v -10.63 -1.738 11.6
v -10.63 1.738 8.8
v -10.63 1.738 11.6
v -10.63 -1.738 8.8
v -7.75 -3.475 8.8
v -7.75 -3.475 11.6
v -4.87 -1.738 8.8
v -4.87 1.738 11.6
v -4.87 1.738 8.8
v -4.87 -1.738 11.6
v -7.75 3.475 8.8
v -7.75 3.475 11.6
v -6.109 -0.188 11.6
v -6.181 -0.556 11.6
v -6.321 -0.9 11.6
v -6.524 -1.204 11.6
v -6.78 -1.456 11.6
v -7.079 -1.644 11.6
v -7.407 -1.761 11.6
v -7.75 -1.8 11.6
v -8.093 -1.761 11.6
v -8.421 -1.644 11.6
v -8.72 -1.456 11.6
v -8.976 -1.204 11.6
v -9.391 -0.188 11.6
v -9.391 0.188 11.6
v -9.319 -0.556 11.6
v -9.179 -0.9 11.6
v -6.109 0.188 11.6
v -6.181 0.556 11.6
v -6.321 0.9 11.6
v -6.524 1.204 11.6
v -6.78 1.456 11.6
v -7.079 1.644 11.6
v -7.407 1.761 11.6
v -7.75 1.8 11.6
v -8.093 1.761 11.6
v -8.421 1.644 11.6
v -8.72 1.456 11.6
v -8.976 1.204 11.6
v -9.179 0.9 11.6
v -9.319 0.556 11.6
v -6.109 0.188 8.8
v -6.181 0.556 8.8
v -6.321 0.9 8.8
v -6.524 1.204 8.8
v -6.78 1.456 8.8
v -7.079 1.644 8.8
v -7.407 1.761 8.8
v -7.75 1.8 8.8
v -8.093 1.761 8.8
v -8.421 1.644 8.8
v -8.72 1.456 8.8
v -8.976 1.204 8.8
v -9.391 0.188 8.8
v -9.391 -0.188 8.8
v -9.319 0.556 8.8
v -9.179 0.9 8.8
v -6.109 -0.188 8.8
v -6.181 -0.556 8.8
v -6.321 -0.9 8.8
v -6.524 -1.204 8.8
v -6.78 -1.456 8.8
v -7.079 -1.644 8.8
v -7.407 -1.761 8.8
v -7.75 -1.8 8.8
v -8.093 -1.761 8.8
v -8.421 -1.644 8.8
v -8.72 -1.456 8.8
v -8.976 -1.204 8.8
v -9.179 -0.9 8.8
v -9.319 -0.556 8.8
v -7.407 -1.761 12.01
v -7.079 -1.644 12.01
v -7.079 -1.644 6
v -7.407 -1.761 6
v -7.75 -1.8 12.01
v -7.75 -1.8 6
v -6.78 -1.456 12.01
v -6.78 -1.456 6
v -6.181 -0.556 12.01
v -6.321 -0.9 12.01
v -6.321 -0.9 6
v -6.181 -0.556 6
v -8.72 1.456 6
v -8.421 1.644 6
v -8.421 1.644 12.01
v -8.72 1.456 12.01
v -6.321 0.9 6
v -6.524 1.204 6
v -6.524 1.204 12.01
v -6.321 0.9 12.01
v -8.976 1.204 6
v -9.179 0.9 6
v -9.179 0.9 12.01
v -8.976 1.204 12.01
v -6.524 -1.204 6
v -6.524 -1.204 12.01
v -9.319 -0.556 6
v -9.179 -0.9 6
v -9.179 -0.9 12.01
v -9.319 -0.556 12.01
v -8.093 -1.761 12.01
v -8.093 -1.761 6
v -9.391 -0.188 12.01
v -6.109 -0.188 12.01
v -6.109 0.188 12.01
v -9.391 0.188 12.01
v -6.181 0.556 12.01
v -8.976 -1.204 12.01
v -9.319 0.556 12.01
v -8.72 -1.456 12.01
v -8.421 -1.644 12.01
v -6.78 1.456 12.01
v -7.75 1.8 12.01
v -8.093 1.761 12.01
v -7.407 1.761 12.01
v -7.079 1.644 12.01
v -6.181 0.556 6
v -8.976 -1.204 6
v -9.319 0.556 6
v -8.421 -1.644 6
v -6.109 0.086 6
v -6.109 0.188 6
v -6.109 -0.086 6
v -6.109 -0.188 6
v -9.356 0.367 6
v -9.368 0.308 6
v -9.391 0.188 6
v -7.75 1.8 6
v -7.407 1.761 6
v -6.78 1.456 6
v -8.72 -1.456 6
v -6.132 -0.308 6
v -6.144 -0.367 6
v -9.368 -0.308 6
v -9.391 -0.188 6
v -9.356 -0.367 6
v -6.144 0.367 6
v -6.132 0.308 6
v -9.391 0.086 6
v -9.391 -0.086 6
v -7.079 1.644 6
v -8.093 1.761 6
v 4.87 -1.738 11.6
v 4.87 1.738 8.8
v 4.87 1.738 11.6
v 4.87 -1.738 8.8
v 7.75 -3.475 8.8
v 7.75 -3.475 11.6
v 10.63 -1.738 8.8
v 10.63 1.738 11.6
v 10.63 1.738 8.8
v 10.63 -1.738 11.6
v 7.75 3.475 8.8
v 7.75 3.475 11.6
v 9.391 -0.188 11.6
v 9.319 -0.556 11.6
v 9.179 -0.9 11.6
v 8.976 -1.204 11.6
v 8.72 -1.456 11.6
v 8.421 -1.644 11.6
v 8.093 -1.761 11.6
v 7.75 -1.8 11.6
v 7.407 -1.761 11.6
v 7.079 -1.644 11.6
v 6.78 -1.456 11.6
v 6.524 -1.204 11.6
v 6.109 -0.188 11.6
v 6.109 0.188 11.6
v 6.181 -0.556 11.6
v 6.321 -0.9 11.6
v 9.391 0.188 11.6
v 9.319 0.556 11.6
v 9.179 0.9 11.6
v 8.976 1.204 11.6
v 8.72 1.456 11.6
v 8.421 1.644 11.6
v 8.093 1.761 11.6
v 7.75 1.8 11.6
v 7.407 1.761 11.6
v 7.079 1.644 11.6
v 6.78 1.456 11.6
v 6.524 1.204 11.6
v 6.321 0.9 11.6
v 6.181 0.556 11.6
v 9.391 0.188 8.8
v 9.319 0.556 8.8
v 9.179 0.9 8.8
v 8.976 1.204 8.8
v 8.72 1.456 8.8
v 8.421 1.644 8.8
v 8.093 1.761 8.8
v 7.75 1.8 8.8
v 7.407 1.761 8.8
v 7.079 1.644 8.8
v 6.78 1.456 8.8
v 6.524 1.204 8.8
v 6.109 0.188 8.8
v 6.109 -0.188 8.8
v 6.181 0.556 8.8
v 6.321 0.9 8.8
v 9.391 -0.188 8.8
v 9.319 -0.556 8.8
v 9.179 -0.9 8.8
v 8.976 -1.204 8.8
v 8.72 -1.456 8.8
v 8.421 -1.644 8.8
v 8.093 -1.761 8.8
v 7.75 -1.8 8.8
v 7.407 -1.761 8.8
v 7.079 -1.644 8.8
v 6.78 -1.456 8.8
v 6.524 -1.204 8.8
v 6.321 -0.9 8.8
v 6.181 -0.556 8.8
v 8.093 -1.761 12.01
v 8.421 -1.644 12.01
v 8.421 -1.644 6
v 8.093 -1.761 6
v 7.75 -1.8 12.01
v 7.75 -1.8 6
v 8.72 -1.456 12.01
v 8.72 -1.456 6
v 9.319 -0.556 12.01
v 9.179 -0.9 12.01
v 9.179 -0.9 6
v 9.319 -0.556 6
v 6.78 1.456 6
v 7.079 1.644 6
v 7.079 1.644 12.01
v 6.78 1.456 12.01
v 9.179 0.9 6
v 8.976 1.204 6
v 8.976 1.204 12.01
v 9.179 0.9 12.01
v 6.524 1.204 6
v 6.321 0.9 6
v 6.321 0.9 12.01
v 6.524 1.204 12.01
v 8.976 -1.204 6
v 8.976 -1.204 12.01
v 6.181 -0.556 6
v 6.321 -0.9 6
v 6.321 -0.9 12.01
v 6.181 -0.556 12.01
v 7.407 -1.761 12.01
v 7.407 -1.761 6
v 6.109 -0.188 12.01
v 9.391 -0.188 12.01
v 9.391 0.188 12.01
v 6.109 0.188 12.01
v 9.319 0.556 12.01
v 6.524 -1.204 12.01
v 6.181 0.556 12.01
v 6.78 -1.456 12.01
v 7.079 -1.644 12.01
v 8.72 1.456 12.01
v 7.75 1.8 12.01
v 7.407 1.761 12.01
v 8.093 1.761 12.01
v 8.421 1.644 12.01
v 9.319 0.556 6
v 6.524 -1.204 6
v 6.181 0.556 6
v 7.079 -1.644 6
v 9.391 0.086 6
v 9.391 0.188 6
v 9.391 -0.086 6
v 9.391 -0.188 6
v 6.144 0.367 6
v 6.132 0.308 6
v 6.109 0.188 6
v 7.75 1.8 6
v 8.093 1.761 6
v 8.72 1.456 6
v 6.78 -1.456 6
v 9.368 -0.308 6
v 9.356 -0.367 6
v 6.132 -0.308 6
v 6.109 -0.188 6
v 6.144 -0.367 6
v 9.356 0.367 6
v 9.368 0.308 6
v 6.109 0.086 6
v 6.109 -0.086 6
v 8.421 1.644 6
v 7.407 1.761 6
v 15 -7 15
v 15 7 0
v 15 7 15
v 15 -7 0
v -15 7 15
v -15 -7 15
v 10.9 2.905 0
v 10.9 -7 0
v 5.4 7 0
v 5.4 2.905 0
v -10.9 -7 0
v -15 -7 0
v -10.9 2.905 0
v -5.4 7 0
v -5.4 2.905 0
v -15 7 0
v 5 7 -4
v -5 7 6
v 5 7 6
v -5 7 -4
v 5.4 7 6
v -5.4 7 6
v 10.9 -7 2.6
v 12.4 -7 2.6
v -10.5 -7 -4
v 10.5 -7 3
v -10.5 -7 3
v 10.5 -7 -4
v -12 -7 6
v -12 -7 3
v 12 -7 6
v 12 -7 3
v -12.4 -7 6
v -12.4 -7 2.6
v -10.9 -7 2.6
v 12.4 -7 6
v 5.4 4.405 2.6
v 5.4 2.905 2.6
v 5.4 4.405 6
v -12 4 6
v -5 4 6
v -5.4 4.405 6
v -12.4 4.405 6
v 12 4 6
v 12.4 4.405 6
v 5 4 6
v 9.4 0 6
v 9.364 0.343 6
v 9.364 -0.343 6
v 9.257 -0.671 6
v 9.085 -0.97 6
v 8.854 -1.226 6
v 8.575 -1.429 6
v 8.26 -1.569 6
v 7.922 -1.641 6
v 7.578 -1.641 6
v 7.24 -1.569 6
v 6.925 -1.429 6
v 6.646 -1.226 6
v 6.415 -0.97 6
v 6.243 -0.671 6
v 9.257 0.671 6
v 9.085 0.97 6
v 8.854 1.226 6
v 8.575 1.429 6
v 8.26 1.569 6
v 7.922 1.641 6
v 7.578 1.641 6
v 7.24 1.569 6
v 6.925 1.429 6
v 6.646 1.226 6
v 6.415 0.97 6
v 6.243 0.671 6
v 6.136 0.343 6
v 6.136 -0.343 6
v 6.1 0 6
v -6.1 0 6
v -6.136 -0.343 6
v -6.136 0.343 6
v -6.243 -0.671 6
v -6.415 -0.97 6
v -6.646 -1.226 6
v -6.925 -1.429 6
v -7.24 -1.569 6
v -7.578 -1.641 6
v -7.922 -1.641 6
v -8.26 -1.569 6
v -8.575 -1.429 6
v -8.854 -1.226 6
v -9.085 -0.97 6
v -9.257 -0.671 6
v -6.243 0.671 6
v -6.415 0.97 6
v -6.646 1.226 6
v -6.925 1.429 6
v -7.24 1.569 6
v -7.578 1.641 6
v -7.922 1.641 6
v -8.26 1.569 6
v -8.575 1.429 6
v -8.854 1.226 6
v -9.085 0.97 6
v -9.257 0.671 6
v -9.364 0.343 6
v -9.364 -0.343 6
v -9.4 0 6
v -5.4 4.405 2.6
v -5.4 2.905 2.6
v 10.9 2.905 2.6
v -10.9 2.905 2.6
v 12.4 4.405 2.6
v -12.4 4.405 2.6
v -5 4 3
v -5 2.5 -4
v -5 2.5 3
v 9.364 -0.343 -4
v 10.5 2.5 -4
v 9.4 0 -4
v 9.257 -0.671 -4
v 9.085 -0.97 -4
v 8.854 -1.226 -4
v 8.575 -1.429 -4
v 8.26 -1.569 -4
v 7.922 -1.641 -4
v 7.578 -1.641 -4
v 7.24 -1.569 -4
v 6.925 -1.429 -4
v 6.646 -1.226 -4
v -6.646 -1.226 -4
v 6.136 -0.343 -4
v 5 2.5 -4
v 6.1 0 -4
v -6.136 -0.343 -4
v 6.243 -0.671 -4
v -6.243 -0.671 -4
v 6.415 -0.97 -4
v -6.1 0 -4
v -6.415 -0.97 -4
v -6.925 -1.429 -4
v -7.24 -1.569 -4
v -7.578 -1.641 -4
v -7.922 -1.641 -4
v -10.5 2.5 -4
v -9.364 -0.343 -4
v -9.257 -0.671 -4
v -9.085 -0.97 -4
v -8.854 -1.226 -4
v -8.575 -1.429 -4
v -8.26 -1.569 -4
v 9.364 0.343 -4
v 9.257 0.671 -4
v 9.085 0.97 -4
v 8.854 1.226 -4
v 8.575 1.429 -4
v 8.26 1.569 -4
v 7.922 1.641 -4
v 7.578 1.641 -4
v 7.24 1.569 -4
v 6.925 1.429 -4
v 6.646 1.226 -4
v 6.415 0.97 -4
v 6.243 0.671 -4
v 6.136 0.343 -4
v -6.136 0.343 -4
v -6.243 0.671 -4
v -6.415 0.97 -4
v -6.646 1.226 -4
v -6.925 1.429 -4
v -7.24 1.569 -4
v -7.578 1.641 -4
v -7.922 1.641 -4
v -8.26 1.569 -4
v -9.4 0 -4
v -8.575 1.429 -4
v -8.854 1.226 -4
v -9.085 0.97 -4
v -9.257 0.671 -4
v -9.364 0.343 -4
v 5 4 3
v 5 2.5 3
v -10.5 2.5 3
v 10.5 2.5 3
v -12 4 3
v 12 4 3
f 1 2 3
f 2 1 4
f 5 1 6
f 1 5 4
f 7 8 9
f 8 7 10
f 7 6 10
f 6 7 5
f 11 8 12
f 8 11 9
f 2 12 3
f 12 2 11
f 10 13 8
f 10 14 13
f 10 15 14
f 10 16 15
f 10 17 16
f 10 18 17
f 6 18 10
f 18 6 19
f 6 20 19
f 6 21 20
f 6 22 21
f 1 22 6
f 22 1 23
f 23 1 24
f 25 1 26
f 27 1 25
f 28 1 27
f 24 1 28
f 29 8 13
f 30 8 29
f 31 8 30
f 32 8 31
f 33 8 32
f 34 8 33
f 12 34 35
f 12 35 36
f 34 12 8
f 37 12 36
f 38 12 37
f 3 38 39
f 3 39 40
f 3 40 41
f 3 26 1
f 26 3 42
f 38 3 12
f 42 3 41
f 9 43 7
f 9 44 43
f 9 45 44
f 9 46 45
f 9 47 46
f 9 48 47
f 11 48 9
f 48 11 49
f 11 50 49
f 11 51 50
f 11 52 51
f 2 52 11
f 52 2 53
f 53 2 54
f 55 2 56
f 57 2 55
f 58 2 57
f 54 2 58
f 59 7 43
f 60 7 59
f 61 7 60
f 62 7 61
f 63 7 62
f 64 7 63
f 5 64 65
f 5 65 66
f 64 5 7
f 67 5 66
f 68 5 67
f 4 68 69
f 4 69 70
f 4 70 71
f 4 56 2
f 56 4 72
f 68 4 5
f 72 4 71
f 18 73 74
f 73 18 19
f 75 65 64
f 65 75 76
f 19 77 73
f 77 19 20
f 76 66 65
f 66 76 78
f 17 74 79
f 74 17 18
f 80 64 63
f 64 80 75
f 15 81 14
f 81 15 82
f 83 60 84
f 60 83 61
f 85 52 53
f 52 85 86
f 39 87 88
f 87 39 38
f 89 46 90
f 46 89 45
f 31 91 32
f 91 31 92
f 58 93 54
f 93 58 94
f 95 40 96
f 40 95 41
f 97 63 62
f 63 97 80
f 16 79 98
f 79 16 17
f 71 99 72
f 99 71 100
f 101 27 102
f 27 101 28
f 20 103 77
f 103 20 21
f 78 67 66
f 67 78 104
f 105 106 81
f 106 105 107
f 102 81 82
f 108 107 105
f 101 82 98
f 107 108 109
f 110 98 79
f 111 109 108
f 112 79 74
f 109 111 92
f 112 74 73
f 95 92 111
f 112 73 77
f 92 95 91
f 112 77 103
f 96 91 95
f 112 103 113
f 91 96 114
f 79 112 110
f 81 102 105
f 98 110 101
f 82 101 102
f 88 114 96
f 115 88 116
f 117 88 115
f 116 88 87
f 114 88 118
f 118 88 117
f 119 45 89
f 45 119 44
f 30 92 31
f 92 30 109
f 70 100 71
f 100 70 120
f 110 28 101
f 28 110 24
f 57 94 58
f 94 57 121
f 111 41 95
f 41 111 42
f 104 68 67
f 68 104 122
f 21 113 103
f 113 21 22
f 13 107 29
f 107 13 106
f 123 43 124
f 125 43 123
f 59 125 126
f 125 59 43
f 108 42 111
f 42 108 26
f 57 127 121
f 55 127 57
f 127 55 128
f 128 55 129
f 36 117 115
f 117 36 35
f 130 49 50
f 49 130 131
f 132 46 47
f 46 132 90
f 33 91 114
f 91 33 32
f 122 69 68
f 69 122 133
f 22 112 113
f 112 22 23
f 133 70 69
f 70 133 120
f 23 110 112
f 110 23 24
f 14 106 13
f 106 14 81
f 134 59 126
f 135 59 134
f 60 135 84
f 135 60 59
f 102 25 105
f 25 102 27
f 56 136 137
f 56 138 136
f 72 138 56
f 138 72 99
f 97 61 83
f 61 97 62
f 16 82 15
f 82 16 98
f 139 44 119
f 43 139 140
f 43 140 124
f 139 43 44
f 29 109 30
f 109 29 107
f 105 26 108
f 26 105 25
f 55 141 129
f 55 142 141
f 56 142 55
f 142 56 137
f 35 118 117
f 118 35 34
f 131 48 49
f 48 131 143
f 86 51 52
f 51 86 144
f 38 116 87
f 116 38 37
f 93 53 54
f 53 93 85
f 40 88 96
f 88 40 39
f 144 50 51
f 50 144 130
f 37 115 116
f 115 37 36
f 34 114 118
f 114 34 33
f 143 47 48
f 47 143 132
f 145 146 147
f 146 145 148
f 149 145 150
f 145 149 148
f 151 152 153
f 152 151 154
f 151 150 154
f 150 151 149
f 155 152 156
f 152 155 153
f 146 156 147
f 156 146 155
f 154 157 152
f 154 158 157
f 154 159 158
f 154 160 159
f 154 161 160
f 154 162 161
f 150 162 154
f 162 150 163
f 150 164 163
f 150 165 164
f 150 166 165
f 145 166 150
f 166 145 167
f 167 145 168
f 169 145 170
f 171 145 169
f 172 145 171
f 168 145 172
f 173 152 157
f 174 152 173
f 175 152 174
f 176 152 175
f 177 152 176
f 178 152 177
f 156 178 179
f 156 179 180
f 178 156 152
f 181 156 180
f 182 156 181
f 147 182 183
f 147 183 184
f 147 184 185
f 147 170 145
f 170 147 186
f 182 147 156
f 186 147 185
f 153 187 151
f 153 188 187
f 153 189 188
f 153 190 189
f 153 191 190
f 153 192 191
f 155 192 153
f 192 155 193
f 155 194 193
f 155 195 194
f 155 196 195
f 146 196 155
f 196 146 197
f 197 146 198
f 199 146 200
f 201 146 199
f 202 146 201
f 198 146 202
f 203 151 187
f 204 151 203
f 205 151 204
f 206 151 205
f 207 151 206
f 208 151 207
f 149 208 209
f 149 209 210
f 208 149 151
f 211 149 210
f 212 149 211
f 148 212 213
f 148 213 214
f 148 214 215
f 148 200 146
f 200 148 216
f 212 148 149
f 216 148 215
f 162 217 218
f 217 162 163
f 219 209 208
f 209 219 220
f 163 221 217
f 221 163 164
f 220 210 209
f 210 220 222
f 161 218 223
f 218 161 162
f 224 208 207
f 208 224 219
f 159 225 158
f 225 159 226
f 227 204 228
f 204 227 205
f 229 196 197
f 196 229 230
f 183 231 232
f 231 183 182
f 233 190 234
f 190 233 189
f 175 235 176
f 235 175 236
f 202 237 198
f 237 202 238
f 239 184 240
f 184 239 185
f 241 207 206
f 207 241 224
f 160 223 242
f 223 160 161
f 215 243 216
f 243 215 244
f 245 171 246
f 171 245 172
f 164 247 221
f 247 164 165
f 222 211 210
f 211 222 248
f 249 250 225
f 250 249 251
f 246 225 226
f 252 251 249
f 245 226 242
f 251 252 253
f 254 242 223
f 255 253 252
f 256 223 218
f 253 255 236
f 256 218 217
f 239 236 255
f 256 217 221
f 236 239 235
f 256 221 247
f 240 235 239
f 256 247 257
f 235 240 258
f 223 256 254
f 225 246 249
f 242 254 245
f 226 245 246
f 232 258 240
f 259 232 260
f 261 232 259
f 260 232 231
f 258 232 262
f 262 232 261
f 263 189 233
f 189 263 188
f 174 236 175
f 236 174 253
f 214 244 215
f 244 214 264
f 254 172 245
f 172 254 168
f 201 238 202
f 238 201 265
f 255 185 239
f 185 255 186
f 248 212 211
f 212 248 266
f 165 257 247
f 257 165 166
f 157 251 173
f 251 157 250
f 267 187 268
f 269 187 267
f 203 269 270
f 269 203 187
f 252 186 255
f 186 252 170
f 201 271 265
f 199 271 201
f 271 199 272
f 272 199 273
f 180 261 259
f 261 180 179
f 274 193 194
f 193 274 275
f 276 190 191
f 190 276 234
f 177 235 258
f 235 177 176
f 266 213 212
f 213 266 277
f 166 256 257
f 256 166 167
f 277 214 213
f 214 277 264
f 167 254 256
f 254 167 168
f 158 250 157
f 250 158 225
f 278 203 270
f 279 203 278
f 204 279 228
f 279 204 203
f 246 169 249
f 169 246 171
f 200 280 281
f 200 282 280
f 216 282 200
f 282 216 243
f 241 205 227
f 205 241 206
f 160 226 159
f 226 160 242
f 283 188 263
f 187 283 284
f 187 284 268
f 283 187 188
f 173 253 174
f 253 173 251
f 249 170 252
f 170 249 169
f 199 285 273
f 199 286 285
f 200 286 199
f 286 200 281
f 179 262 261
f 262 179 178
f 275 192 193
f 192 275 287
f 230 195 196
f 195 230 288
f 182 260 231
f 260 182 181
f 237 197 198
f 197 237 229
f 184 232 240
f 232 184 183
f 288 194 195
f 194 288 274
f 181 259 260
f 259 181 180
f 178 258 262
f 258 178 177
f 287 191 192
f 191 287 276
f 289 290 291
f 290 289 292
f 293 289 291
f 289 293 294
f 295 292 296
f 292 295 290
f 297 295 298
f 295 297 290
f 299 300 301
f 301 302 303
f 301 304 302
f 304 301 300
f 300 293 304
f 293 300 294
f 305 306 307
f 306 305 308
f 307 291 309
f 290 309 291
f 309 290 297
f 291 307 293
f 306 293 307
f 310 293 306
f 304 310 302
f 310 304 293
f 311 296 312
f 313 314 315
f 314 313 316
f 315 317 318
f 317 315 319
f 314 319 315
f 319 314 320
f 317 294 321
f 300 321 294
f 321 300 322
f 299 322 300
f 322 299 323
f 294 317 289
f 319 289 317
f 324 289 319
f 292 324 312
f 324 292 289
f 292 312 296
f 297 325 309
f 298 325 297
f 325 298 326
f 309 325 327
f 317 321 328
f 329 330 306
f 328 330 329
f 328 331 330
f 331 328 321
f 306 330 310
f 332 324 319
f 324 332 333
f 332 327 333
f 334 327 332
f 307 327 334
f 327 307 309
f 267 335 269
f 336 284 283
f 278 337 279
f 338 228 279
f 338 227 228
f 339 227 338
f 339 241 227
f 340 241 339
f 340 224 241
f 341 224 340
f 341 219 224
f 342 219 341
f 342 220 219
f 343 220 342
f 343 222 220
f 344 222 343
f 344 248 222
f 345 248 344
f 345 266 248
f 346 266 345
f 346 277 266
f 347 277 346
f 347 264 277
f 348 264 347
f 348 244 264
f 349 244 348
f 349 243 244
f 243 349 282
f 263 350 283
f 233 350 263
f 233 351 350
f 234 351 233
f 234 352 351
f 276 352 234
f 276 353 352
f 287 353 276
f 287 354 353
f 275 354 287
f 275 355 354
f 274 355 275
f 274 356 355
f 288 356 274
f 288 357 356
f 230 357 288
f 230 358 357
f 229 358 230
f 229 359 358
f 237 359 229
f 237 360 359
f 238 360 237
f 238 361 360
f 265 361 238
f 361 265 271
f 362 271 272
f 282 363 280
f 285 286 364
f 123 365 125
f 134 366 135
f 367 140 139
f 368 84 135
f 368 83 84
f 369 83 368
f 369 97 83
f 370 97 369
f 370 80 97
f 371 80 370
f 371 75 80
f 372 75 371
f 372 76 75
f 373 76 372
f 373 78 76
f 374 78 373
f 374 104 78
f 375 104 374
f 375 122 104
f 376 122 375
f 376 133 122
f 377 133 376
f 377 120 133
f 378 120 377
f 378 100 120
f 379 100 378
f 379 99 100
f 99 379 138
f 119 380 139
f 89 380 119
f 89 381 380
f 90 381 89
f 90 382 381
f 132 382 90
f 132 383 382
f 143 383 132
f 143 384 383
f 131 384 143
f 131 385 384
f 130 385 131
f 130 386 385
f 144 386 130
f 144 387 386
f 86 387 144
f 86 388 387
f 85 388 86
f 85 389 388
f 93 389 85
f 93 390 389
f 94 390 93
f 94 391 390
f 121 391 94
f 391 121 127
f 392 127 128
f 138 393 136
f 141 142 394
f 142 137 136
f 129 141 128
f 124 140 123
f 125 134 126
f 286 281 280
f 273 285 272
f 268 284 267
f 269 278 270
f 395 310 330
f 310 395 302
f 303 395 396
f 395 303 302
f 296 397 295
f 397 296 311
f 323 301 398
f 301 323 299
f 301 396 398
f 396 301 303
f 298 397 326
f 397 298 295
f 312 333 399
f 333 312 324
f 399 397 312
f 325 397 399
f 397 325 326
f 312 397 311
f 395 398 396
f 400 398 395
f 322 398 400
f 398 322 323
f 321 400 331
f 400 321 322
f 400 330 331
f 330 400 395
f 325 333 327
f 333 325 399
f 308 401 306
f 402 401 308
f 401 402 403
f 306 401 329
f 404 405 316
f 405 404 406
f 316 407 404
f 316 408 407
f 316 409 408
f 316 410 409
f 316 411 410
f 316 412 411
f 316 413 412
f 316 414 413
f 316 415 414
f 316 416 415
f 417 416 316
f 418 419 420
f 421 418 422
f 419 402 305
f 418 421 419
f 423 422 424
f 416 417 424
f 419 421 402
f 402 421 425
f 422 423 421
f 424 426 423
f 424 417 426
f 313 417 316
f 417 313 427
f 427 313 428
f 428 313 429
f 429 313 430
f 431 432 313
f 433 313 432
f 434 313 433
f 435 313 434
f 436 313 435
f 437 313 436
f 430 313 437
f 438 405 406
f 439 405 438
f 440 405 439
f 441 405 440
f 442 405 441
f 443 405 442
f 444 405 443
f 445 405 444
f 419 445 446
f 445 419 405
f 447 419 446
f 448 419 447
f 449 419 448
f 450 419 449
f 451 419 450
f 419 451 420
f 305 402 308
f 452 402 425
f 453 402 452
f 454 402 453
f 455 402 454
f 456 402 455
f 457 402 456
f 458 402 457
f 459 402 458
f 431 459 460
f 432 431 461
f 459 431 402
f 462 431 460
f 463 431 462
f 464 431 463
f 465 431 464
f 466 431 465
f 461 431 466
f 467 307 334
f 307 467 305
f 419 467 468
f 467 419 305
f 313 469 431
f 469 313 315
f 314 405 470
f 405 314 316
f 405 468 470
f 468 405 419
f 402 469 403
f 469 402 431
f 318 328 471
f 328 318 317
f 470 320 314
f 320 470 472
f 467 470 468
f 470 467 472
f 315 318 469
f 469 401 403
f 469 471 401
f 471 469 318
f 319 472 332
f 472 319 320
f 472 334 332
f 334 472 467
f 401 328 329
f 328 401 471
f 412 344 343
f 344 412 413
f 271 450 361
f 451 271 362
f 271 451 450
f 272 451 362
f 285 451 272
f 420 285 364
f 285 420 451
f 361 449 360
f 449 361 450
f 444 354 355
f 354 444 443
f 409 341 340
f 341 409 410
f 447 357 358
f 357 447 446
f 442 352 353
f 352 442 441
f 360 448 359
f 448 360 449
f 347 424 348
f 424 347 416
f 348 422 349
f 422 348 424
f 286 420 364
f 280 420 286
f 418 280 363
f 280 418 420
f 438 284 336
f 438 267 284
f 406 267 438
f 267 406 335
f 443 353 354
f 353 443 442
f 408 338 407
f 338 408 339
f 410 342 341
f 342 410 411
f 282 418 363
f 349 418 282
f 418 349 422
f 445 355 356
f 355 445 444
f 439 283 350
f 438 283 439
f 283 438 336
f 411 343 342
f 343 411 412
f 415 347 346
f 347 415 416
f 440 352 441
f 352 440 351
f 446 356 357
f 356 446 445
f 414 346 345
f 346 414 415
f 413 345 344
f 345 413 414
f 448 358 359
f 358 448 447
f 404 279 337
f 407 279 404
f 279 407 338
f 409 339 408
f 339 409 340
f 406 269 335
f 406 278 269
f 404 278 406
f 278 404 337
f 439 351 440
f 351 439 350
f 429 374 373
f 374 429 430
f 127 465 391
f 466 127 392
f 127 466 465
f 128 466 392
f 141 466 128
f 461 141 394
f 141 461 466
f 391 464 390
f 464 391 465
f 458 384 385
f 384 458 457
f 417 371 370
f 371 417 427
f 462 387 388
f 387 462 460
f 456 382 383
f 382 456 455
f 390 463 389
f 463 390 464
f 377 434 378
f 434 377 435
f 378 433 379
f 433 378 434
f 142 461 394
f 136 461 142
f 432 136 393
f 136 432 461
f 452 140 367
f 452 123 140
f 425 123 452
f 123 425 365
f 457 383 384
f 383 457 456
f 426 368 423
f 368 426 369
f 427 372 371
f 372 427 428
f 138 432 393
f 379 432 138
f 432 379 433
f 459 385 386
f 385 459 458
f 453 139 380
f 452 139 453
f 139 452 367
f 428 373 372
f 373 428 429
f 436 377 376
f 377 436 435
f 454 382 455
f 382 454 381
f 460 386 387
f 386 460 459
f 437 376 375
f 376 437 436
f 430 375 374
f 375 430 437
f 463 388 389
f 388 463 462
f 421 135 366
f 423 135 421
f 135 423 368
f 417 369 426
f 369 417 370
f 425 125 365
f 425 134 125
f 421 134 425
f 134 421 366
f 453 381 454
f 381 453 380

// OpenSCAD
// BambuLab A1 Gantry Mounting Bracket
//
// Note that bracket_thickness cannot go beyond 5mm, in order to
// leave enough clearance to the toolhead.
include <BOSL2/std.scad>

/* [Bracket Dimensions (mm)] */
bracket_thickness = 5; // [3:1:5]
bracket_width = 44; // [10:1:50]
arm_length = 30; // [10:1:90]
dovetail_depth = 6; // [10:1:30]
dovetail_gap = .6; // [.1:.1:1]
gantry_clearance = 20; // [20:1:50]

/* [Hidden] */
//$preview = true;
local = 0;
$fa = $preview ? 8 : 1;
$fs = $preview ? 1 : 0.1;

// Manifest dimensions (A1 traversal)
a1_inner_width = 40.5;
a1_inner_height = 20.5;
a1_inner_radius = 5;

wall_thickness = 1.5; // [0.4:0.1:5]
layer_height = 0.2;
tolerance = 0.25;
epsilon = 0.05;
chamfer = 0.3;


// Generates an open 2D path that wraps left/right along the front wall face
function dovetail_flanged_wall_path(width=dovetail_depth / 4, depth=dovetail_depth, angle=45, flange_width=c230_arm_angle, tolerance=tolerance) =
    let(
        w_neck = width + (2 * tolerance),
        w_base = w_neck + (2 * depth * tan(c230_arm_angle)),

        // Coordinates for the flanged track running along the face and into the socket:
        p1 = [-w_neck/2 - flange_width, 0], // Far Left Flange (on the face)
        p2 = [-w_neck/2, 0],                // Left Neck Entry
        p3 = [-w_base/2, -depth],           // Deep Left Base
        p4 = [ w_base/2, -depth],           // Deep Right Base
        p5 = [ w_neck/2, 0],                // Right Neck Entry
        p6 = [ w_neck/2 + flange_width, 0]  // Far Right Flange (on the face)
    )
    [p1, p2, p3, p4, p5, p6];


module rounded_layer(size) {
    intersection() {
        cuboid([size, size, epsilon],
               anchor=TOP);
        cuboid([size, size, 4 * wall_thickness],
               rounding=2 * wall_thickness, anchor=TOP);
    }
}


// ====================================================================
// A1 Mounting Bracket
// ====================================================================

bracket_dove_thickness = 2 * dovetail_depth + bracket_thickness;

module bracket_block(chamfer=0, extend_y=0, extend_z=0) {
    cuboid([bracket_width,
            a1_inner_width + 2 * extend_y,
            a1_inner_height + 2 * extend_z],
           chamfer = chamfer);
}

module dovetail_cutter() {
    dt_path = dovetail_flanged_wall_path(flange_width=a1_inner_height);
    smooth_path = round_corners(dt_path, radius=1.5 * chamfer, closed=false);
    linear_extrude(height=bracket_width, center=true)
        stroke(smooth_path, width=dovetail_gap, closed=false);
}

module clearance_guard() {
    module clearance_block(wall=0, cdir=1) {
        right(chamfer)
        cuboid([gantry_clearance + 3 * chamfer,
                a1_inner_width / 4 + wall,
                a1_inner_height + 2 * wall],
            chamfer = cdir * chamfer);
    }

    left((bracket_width + gantry_clearance) / 2 - epsilon)
    back(a1_inner_width / 8 * 3 + wall_thickness - epsilon)
    fwd(2 * chamfer + 2 * epsilon)
    round3d(r=2 * chamfer, $fn=5) {
        difference() {
            right(chamfer)
            clearance_block(wall_thickness, 1);

            fwd(wall_thickness / 2 + epsilon)
            xscale(1.1)
            clearance_block(-epsilon / 2, 0);
        }
    }
}

module a1_bracket() {
    clearance_guard();

    difference() {
        //color("lime", alpha=.3)
        bracket_block(extend_y=bracket_thickness,
                      extend_z=bracket_dove_thickness,
                      chamfer=2 * chamfer);

        yrot(90)
        cuboid([a1_inner_height,
                a1_inner_width,
                bracket_width + epsilon],
            chamfer = -chamfer);

        up(a1_inner_height / 2 + 1.5 * dovetail_depth)
            yrot(90) dovetail_cutter();
        down(a1_inner_height / 2 + 1.5 * dovetail_depth)
            yrot(90) dovetail_cutter();
    }
}


// ====================================================================
// Tapo C230 Camera Mount
// ====================================================================

c230_bar_diameter = bracket_width - epsilon;
c230_bar_width = 7; // [3:1:30]
c230_top_diameter = 29; // [10:0.1:50]
c230_bottom_diameter = 31; // [10:0.1:50]
c230_cone_height = 6; // [2:0.25:20]
c230_arm_angle = 35;

c230_bar_height = wall_thickness;


module c230_friction_dot(direction=1) {
    up(c230_cone_height - .85 * c230_bar_height)
    fwd(direction * (c230_bar_diameter / 2 - wall_thickness))
    left(direction * (c230_bar_width / 2 - wall_thickness))
        spheroid(r=c230_bar_height / 2);
}

module c230_camera_holder() {
    union() {
        // Twist-lock bar tongues
        up(c230_cone_height)
        intersection() {
            cyl(
                h=c230_bar_height,
                d=c230_bar_diameter,
                anchor=TOP
            );
            up(wall_thickness / 2)
            cuboid([c230_bar_width, c230_bar_diameter, 2 * c230_bar_height],
                   rounding=wall_thickness, anchor=TOP);
        }

        zrot(45) hull() {
            up(c230_cone_height)
                rounded_layer(c230_top_diameter - 4 * wall_thickness);
            up(c230_cone_height - wall_thickness / 2)
                rounded_layer(c230_top_diameter - 2 * wall_thickness);
        }
        zrot(45) hull() {
            up(c230_cone_height - wall_thickness / 2)
                rounded_layer(c230_top_diameter - 2 * wall_thickness);
            rounded_layer(c230_bottom_diameter);
        }

        // Supporting chamfers for the bar
        up(c230_cone_height)
            cuboid([c230_bar_width - wall_thickness / 2,
                    c230_top_diameter + 2 * wall_thickness,
                    2 * wall_thickness],
                   chamfer=wall_thickness, anchor=TOP);

        // Friction dots
        c230_friction_dot(direction=1);
        c230_friction_dot(direction=-1);
    }
}

module c230_camera_arm() {
    diameter = c230_bar_diameter;
    points = [
        [0, -arm_length],
        [0, diameter * tan(c230_arm_angle)],
        [diameter, 0],
        [diameter, -arm_length],
    ];

    union() {
        //color("red")
        zrot(45)
        up(arm_length)
        back(diameter / 2) left(diameter / 2)
        xrot(90)
            offset_sweep(height=diameter,
                path=points,
                ends = os_chamfer(width = 2 * chamfer));

        xrot(180)
            c230_camera_holder();
    }
}


// ====================================================================
// Main Assembly & Plates
// ====================================================================

module mw_plate_1() {
    up(bracket_width / 2) yrot(90) a1_bracket();
}

module mw_plate_2() {
    up(bracket_width / 2) yrot(90) union() {
        a1_bracket();

        up(bracket_dove_thickness + a1_inner_height / 3 + 6.6 * chamfer)
        fwd(a1_inner_width + a1_inner_width / 2)
        yrot(90) zrot(55) yrot(90) zrot(45)
        c230_camera_arm();
    }
}

if ($preview || local) { // main assembly in Parametric Model Maker
    mw_plate_2();
    //c230_camera_arm();
}
